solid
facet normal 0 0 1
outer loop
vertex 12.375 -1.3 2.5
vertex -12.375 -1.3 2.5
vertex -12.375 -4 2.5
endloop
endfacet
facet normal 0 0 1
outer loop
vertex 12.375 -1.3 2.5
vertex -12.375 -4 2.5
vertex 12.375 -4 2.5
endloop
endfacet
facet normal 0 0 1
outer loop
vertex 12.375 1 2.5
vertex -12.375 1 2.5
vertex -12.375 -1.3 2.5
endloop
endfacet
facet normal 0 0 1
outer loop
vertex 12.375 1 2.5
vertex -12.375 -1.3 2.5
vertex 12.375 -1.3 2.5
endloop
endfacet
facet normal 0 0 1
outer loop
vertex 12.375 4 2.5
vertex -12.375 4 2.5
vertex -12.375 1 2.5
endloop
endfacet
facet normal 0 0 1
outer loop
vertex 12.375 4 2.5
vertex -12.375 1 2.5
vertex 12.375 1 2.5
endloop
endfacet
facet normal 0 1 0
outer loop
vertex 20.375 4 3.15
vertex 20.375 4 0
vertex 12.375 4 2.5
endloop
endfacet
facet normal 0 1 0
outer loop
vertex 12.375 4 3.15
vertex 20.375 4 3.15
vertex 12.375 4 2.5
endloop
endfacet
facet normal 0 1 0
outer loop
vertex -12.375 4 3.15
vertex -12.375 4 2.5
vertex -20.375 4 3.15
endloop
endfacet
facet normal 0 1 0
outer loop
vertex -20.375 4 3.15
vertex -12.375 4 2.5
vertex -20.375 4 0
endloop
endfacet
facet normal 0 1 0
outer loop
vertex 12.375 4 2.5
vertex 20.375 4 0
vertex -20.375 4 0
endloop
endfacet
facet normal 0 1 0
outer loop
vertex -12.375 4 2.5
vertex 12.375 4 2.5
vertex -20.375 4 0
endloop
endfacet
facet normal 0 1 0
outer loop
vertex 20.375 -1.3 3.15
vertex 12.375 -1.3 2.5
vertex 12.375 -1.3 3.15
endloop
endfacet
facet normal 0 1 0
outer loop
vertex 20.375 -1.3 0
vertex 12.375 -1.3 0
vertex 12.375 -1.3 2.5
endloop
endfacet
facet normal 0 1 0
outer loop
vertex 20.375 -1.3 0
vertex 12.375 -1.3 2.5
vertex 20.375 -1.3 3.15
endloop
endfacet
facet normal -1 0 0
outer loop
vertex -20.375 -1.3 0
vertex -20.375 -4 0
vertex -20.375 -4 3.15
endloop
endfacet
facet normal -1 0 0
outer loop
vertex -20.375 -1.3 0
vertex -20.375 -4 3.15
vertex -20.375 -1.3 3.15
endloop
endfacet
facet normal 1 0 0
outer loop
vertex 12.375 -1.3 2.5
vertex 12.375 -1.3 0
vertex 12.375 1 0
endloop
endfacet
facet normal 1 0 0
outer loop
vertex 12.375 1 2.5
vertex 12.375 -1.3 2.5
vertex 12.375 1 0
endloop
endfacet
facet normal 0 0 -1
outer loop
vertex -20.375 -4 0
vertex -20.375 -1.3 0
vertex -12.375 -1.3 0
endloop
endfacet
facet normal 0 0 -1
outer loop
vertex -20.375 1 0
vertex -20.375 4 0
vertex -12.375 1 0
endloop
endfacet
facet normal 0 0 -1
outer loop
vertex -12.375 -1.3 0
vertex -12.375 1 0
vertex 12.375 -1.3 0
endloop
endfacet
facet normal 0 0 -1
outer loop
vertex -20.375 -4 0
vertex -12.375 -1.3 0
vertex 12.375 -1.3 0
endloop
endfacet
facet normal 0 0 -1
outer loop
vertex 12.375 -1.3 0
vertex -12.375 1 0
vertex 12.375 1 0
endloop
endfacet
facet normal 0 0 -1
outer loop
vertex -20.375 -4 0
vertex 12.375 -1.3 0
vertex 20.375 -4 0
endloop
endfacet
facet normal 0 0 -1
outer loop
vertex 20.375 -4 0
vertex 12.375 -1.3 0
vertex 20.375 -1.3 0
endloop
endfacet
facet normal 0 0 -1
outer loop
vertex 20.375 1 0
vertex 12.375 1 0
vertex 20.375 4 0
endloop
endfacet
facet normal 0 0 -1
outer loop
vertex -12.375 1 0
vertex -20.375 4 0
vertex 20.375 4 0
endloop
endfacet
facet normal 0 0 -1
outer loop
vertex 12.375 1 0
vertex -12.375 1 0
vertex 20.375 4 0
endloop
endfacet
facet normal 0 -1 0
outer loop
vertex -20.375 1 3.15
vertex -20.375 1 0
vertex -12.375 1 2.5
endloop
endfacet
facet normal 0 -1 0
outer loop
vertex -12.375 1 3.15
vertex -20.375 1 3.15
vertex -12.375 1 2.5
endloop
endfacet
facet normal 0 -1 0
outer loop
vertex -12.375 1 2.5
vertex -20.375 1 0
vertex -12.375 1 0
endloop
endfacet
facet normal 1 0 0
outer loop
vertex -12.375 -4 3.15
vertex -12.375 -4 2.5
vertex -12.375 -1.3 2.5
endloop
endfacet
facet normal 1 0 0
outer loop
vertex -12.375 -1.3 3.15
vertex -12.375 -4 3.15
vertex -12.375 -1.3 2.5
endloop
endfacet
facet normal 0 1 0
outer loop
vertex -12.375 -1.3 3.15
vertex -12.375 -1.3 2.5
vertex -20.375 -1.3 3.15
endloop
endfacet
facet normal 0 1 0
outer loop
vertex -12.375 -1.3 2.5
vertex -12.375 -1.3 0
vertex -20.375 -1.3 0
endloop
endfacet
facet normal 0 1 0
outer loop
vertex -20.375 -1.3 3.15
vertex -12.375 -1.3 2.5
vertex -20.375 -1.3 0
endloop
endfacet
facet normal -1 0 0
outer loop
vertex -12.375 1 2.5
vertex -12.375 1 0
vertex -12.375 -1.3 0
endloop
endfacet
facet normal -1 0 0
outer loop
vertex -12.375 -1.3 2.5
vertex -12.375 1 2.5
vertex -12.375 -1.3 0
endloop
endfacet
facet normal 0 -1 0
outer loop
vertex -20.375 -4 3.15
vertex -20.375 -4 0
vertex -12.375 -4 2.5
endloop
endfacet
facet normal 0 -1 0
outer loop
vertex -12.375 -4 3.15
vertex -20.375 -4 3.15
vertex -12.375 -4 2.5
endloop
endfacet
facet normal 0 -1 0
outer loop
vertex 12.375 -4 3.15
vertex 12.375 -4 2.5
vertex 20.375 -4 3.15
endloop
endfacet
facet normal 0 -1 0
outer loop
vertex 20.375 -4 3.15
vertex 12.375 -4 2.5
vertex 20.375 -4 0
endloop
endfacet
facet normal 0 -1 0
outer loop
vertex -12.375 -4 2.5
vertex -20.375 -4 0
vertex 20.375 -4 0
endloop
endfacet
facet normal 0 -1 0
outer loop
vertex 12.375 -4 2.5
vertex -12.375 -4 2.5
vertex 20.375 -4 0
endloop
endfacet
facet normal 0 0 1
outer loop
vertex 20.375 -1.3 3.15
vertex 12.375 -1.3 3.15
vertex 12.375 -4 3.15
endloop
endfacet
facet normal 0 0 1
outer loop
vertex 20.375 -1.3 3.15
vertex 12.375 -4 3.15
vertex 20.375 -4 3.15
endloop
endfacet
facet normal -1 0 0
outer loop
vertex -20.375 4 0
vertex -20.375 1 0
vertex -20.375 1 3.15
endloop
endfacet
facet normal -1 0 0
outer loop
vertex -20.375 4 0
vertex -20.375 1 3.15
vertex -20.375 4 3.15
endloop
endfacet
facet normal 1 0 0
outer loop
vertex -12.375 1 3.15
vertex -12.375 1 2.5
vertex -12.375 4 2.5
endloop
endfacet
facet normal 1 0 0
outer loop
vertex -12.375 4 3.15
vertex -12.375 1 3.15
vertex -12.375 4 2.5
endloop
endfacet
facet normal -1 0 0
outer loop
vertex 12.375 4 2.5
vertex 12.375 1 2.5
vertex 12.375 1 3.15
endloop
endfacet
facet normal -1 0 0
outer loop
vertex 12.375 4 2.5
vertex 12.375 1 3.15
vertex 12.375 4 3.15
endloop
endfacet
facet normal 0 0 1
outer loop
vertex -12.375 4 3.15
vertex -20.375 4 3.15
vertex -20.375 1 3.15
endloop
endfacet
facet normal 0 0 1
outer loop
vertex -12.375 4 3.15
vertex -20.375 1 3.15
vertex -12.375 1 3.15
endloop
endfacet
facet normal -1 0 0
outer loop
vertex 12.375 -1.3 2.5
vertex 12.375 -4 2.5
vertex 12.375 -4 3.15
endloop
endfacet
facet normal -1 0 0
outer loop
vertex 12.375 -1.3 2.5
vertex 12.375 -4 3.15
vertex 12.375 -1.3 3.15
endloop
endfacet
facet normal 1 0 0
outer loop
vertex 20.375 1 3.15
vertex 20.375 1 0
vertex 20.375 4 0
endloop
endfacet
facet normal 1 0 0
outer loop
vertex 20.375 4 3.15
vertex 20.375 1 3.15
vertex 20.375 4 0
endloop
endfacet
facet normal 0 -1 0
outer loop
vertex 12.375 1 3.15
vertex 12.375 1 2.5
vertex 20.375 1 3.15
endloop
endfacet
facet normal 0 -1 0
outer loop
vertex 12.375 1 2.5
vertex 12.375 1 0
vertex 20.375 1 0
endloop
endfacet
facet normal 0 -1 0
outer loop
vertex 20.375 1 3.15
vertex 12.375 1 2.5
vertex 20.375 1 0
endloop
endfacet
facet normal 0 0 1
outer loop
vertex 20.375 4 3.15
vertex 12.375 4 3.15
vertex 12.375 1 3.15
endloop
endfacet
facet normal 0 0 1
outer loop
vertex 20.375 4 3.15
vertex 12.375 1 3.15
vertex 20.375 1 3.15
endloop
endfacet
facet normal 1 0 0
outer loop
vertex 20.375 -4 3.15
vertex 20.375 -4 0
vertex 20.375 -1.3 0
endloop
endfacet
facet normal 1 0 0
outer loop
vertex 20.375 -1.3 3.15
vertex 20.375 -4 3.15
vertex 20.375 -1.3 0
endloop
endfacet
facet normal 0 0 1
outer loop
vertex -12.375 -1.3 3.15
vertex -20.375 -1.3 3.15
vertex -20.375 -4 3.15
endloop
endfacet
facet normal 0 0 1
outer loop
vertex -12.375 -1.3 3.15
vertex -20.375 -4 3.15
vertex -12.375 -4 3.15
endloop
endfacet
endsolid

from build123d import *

# Parameters (mm, degrees)
BOSS_EXTRUDE1_DEPTH = 2.5
SKETCH1_3_W         = 3.753393981
SKETCH1_3_H         = 3
SKETCH1_3_W_2       = 4.246606019
SKETCH1_3_H_2       = 2.7
SKETCH1_3_W_3       = 8
BOSS_EXTRUDE2_DEPTH = 3.15


with BuildPart() as part:
    # Sketch1 → Boss-Extrude1 (new body)
    with BuildSketch(Plane.XY):
        Polygon((12.375, 4), (-12.375, 4), (-12.375, 1), (-12.375, -1.3), (-12.375, -4), (12.375, -4), (12.375, -1.3), (12.375, 1), align=None)
    extrude(amount=BOSS_EXTRUDE1_DEPTH)

    # Sketch1<3> → Boss-Extrude2 (add)
    with BuildSketch(Plane.XY):
        with Locations((-18.498303009, 2.5)):
            Rectangle(SKETCH1_3_W, SKETCH1_3_H)
        with Locations((-14.49830301, 2.5)):
            Rectangle(SKETCH1_3_W_2, SKETCH1_3_H)
        with Locations((-14.49830301, -2.65)):
            Rectangle(SKETCH1_3_W_2, SKETCH1_3_H_2)
        with Locations((-18.498303009, -2.65)):
            Rectangle(SKETCH1_3_W, SKETCH1_3_H_2)
        with Locations((16.375, -2.65)):
            Rectangle(SKETCH1_3_W_3, SKETCH1_3_H_2)
        with Locations((16.375, 2.5)):
            Rectangle(SKETCH1_3_W_3, SKETCH1_3_H)
    extrude(amount=BOSS_EXTRUDE2_DEPTH)


solid = part.part
